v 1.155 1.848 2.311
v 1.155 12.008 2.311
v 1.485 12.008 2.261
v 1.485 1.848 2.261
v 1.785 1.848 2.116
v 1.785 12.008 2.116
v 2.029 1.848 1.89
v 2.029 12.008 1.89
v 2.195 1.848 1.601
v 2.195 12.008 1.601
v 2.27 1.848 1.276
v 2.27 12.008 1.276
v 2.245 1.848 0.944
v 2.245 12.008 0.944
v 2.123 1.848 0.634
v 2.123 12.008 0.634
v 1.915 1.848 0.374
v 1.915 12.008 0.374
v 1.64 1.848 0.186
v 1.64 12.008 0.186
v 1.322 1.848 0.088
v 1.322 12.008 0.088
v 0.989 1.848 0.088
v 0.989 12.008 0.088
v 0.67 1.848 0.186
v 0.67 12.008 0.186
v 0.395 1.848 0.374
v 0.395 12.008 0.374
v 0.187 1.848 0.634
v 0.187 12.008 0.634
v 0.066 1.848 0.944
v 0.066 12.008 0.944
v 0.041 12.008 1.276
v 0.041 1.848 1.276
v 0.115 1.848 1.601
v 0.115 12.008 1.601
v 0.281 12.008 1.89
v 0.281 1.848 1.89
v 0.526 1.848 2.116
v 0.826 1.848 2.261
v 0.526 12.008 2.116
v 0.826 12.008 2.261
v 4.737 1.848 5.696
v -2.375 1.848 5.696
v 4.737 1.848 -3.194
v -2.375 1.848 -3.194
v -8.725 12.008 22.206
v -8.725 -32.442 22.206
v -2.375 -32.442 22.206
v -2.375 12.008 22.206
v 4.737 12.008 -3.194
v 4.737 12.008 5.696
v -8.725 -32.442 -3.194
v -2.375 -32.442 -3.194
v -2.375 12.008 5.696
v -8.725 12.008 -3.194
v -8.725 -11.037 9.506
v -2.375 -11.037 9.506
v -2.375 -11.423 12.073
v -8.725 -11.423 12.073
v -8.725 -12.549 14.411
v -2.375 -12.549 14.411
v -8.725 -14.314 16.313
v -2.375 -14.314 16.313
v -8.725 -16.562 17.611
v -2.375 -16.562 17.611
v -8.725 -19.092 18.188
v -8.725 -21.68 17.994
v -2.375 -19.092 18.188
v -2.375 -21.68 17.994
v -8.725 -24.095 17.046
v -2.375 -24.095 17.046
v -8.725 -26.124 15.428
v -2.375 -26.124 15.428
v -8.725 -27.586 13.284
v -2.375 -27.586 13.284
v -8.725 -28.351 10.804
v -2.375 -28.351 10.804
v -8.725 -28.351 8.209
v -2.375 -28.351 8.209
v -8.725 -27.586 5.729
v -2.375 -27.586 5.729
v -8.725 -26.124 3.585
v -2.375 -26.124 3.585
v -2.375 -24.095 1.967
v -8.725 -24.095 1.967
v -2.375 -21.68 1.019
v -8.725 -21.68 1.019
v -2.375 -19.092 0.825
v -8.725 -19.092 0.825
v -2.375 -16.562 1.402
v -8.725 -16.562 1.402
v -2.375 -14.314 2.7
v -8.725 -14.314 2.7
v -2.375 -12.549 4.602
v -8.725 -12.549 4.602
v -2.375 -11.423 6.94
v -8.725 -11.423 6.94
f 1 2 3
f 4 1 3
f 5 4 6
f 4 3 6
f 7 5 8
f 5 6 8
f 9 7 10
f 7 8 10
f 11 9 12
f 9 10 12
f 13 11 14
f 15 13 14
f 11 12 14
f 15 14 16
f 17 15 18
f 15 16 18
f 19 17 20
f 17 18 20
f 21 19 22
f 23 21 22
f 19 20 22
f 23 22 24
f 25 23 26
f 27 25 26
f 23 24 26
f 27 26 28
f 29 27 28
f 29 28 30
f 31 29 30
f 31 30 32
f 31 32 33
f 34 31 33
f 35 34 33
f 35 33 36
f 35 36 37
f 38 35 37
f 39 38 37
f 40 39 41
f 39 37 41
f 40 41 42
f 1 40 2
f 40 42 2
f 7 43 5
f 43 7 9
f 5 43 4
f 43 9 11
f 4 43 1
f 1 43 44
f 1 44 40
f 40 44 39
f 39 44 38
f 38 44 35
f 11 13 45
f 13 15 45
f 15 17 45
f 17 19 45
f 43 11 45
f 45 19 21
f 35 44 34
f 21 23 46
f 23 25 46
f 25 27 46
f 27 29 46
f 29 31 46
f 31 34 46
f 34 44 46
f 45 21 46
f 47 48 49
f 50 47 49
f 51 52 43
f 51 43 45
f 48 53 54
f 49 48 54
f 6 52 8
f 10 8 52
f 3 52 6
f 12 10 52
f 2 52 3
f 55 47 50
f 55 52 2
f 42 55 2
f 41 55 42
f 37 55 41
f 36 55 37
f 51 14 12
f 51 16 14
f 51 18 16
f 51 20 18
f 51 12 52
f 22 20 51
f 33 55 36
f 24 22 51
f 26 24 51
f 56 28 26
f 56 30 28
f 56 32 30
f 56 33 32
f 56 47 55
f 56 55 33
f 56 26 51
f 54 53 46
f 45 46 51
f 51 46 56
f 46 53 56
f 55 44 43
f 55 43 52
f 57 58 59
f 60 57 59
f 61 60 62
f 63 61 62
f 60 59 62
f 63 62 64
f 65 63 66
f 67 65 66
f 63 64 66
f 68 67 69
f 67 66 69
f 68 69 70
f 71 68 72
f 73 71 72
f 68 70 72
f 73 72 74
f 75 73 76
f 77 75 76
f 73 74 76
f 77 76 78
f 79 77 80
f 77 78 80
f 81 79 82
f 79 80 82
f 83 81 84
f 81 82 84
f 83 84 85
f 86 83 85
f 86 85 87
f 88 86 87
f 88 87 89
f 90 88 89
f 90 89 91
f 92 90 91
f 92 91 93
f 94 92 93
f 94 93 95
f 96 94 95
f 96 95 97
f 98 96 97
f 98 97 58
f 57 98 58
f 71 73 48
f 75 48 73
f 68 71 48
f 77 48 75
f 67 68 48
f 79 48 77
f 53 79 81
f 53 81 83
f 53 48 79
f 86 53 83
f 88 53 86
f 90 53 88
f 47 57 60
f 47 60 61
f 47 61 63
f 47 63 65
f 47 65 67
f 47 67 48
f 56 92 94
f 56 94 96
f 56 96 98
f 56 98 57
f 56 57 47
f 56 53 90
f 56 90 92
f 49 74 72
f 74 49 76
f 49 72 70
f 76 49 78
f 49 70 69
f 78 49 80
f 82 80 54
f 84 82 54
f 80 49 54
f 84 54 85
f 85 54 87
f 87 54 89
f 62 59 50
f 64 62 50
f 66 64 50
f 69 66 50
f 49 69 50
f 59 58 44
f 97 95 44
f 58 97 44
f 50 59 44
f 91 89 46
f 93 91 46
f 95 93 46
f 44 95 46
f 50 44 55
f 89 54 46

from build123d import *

# Parameters (mm, degrees)
SKETCH1_W           = 6.35
SKETCH1_H           = 44.45
BOSS_EXTRUDE1_DEPTH = 25.4
SKETCH2_W           = 8.89
SKETCH2_H           = 10.16
BOSS_EXTRUDE2_DEPTH = 7.112
SKETCH4_R           = 6.441586538
CUT_EXTRUDE1_DEPTH  = 6.35
CUT_EXTRUDE2_REACH  = 41.953
SKETCH3_R           = 8.70585
SKETCH5_R           = 1.1176
SKETCH5_R_2         = 0.9906
CUT_EXTRUDE3_DEPTH  = 10.16


with BuildPart() as part:
    # Sketch1 → Boss-Extrude1 (new body)
    with BuildSketch(Plane.XY.offset(-3.193523187)):
        with Locations((-5.550476906, -10.21740419)):
            Rectangle(SKETCH1_W, SKETCH1_H)
    extrude(amount=BOSS_EXTRUDE1_DEPTH)

    # Sketch2 → Boss-Extrude2 (add)
    with BuildSketch(Plane(origin=(-2.375476906, 0, 0), x_dir=(0, 0, -1), z_dir=(1, 0, 0))):
        with Locations((-1.251476813, 6.92759581)):
            Rectangle(SKETCH2_W, SKETCH2_H)
    extrude(amount=BOSS_EXTRUDE2_DEPTH)

    # Sketch4 → Cut-Extrude1 (cut)
    with BuildSketch(Plane(origin=(-2.375476906, 0, 0), x_dir=(0, 0, -1), z_dir=(1, 0, 0))):
        with Locations(Location((-9.506476813, -19.74240419, 0), (0, 0, 90))):
            Circle(SKETCH4_R)
    extrude(amount=-CUT_EXTRUDE1_DEPTH, mode=Mode.SUBTRACT)

    # Sketch3 → Cut-Extrude2 (cut, up to next)
    with BuildSketch(Plane(origin=(-2.375476906, 0, 0), x_dir=(0, 0, -1), z_dir=(1, 0, 0)), mode=Mode.PRIVATE) as cut_extrude2_sk1:
        with Locations(Location((-9.506476813, -19.74240419, 0), (0, 0, 90))):
            Circle(SKETCH3_R)
    cut_extrude2_tool1 = extrude(cut_extrude2_sk1.sketch, amount=-CUT_EXTRUDE2_REACH, mode=Mode.PRIVATE) & part.part
    add(cut_extrude2_tool1.solids().sort_by_distance((-2.375477, -19.742404, 9.506477))[0], mode=Mode.SUBTRACT)

    # Sketch5 → Cut-Extrude3 (cut)
    with BuildSketch(Plane(origin=(0, 12.00759581, 0), x_dir=(1, 0, 0), z_dir=(0, 1, 0))):
        with Locations(Location((1.155123094, -1.192963507, 0), (0, 0, 270))):
            Circle(SKETCH5_R)
        with Locations((1.155123094, -1.192963507)):
            Circle(SKETCH5_R_2, mode=Mode.SUBTRACT)
        with Locations((1.155123094, -1.192963507)):
            Circle(SKETCH5_R_2)
    extrude(amount=-CUT_EXTRUDE3_DEPTH, mode=Mode.SUBTRACT)


solid = part.part
